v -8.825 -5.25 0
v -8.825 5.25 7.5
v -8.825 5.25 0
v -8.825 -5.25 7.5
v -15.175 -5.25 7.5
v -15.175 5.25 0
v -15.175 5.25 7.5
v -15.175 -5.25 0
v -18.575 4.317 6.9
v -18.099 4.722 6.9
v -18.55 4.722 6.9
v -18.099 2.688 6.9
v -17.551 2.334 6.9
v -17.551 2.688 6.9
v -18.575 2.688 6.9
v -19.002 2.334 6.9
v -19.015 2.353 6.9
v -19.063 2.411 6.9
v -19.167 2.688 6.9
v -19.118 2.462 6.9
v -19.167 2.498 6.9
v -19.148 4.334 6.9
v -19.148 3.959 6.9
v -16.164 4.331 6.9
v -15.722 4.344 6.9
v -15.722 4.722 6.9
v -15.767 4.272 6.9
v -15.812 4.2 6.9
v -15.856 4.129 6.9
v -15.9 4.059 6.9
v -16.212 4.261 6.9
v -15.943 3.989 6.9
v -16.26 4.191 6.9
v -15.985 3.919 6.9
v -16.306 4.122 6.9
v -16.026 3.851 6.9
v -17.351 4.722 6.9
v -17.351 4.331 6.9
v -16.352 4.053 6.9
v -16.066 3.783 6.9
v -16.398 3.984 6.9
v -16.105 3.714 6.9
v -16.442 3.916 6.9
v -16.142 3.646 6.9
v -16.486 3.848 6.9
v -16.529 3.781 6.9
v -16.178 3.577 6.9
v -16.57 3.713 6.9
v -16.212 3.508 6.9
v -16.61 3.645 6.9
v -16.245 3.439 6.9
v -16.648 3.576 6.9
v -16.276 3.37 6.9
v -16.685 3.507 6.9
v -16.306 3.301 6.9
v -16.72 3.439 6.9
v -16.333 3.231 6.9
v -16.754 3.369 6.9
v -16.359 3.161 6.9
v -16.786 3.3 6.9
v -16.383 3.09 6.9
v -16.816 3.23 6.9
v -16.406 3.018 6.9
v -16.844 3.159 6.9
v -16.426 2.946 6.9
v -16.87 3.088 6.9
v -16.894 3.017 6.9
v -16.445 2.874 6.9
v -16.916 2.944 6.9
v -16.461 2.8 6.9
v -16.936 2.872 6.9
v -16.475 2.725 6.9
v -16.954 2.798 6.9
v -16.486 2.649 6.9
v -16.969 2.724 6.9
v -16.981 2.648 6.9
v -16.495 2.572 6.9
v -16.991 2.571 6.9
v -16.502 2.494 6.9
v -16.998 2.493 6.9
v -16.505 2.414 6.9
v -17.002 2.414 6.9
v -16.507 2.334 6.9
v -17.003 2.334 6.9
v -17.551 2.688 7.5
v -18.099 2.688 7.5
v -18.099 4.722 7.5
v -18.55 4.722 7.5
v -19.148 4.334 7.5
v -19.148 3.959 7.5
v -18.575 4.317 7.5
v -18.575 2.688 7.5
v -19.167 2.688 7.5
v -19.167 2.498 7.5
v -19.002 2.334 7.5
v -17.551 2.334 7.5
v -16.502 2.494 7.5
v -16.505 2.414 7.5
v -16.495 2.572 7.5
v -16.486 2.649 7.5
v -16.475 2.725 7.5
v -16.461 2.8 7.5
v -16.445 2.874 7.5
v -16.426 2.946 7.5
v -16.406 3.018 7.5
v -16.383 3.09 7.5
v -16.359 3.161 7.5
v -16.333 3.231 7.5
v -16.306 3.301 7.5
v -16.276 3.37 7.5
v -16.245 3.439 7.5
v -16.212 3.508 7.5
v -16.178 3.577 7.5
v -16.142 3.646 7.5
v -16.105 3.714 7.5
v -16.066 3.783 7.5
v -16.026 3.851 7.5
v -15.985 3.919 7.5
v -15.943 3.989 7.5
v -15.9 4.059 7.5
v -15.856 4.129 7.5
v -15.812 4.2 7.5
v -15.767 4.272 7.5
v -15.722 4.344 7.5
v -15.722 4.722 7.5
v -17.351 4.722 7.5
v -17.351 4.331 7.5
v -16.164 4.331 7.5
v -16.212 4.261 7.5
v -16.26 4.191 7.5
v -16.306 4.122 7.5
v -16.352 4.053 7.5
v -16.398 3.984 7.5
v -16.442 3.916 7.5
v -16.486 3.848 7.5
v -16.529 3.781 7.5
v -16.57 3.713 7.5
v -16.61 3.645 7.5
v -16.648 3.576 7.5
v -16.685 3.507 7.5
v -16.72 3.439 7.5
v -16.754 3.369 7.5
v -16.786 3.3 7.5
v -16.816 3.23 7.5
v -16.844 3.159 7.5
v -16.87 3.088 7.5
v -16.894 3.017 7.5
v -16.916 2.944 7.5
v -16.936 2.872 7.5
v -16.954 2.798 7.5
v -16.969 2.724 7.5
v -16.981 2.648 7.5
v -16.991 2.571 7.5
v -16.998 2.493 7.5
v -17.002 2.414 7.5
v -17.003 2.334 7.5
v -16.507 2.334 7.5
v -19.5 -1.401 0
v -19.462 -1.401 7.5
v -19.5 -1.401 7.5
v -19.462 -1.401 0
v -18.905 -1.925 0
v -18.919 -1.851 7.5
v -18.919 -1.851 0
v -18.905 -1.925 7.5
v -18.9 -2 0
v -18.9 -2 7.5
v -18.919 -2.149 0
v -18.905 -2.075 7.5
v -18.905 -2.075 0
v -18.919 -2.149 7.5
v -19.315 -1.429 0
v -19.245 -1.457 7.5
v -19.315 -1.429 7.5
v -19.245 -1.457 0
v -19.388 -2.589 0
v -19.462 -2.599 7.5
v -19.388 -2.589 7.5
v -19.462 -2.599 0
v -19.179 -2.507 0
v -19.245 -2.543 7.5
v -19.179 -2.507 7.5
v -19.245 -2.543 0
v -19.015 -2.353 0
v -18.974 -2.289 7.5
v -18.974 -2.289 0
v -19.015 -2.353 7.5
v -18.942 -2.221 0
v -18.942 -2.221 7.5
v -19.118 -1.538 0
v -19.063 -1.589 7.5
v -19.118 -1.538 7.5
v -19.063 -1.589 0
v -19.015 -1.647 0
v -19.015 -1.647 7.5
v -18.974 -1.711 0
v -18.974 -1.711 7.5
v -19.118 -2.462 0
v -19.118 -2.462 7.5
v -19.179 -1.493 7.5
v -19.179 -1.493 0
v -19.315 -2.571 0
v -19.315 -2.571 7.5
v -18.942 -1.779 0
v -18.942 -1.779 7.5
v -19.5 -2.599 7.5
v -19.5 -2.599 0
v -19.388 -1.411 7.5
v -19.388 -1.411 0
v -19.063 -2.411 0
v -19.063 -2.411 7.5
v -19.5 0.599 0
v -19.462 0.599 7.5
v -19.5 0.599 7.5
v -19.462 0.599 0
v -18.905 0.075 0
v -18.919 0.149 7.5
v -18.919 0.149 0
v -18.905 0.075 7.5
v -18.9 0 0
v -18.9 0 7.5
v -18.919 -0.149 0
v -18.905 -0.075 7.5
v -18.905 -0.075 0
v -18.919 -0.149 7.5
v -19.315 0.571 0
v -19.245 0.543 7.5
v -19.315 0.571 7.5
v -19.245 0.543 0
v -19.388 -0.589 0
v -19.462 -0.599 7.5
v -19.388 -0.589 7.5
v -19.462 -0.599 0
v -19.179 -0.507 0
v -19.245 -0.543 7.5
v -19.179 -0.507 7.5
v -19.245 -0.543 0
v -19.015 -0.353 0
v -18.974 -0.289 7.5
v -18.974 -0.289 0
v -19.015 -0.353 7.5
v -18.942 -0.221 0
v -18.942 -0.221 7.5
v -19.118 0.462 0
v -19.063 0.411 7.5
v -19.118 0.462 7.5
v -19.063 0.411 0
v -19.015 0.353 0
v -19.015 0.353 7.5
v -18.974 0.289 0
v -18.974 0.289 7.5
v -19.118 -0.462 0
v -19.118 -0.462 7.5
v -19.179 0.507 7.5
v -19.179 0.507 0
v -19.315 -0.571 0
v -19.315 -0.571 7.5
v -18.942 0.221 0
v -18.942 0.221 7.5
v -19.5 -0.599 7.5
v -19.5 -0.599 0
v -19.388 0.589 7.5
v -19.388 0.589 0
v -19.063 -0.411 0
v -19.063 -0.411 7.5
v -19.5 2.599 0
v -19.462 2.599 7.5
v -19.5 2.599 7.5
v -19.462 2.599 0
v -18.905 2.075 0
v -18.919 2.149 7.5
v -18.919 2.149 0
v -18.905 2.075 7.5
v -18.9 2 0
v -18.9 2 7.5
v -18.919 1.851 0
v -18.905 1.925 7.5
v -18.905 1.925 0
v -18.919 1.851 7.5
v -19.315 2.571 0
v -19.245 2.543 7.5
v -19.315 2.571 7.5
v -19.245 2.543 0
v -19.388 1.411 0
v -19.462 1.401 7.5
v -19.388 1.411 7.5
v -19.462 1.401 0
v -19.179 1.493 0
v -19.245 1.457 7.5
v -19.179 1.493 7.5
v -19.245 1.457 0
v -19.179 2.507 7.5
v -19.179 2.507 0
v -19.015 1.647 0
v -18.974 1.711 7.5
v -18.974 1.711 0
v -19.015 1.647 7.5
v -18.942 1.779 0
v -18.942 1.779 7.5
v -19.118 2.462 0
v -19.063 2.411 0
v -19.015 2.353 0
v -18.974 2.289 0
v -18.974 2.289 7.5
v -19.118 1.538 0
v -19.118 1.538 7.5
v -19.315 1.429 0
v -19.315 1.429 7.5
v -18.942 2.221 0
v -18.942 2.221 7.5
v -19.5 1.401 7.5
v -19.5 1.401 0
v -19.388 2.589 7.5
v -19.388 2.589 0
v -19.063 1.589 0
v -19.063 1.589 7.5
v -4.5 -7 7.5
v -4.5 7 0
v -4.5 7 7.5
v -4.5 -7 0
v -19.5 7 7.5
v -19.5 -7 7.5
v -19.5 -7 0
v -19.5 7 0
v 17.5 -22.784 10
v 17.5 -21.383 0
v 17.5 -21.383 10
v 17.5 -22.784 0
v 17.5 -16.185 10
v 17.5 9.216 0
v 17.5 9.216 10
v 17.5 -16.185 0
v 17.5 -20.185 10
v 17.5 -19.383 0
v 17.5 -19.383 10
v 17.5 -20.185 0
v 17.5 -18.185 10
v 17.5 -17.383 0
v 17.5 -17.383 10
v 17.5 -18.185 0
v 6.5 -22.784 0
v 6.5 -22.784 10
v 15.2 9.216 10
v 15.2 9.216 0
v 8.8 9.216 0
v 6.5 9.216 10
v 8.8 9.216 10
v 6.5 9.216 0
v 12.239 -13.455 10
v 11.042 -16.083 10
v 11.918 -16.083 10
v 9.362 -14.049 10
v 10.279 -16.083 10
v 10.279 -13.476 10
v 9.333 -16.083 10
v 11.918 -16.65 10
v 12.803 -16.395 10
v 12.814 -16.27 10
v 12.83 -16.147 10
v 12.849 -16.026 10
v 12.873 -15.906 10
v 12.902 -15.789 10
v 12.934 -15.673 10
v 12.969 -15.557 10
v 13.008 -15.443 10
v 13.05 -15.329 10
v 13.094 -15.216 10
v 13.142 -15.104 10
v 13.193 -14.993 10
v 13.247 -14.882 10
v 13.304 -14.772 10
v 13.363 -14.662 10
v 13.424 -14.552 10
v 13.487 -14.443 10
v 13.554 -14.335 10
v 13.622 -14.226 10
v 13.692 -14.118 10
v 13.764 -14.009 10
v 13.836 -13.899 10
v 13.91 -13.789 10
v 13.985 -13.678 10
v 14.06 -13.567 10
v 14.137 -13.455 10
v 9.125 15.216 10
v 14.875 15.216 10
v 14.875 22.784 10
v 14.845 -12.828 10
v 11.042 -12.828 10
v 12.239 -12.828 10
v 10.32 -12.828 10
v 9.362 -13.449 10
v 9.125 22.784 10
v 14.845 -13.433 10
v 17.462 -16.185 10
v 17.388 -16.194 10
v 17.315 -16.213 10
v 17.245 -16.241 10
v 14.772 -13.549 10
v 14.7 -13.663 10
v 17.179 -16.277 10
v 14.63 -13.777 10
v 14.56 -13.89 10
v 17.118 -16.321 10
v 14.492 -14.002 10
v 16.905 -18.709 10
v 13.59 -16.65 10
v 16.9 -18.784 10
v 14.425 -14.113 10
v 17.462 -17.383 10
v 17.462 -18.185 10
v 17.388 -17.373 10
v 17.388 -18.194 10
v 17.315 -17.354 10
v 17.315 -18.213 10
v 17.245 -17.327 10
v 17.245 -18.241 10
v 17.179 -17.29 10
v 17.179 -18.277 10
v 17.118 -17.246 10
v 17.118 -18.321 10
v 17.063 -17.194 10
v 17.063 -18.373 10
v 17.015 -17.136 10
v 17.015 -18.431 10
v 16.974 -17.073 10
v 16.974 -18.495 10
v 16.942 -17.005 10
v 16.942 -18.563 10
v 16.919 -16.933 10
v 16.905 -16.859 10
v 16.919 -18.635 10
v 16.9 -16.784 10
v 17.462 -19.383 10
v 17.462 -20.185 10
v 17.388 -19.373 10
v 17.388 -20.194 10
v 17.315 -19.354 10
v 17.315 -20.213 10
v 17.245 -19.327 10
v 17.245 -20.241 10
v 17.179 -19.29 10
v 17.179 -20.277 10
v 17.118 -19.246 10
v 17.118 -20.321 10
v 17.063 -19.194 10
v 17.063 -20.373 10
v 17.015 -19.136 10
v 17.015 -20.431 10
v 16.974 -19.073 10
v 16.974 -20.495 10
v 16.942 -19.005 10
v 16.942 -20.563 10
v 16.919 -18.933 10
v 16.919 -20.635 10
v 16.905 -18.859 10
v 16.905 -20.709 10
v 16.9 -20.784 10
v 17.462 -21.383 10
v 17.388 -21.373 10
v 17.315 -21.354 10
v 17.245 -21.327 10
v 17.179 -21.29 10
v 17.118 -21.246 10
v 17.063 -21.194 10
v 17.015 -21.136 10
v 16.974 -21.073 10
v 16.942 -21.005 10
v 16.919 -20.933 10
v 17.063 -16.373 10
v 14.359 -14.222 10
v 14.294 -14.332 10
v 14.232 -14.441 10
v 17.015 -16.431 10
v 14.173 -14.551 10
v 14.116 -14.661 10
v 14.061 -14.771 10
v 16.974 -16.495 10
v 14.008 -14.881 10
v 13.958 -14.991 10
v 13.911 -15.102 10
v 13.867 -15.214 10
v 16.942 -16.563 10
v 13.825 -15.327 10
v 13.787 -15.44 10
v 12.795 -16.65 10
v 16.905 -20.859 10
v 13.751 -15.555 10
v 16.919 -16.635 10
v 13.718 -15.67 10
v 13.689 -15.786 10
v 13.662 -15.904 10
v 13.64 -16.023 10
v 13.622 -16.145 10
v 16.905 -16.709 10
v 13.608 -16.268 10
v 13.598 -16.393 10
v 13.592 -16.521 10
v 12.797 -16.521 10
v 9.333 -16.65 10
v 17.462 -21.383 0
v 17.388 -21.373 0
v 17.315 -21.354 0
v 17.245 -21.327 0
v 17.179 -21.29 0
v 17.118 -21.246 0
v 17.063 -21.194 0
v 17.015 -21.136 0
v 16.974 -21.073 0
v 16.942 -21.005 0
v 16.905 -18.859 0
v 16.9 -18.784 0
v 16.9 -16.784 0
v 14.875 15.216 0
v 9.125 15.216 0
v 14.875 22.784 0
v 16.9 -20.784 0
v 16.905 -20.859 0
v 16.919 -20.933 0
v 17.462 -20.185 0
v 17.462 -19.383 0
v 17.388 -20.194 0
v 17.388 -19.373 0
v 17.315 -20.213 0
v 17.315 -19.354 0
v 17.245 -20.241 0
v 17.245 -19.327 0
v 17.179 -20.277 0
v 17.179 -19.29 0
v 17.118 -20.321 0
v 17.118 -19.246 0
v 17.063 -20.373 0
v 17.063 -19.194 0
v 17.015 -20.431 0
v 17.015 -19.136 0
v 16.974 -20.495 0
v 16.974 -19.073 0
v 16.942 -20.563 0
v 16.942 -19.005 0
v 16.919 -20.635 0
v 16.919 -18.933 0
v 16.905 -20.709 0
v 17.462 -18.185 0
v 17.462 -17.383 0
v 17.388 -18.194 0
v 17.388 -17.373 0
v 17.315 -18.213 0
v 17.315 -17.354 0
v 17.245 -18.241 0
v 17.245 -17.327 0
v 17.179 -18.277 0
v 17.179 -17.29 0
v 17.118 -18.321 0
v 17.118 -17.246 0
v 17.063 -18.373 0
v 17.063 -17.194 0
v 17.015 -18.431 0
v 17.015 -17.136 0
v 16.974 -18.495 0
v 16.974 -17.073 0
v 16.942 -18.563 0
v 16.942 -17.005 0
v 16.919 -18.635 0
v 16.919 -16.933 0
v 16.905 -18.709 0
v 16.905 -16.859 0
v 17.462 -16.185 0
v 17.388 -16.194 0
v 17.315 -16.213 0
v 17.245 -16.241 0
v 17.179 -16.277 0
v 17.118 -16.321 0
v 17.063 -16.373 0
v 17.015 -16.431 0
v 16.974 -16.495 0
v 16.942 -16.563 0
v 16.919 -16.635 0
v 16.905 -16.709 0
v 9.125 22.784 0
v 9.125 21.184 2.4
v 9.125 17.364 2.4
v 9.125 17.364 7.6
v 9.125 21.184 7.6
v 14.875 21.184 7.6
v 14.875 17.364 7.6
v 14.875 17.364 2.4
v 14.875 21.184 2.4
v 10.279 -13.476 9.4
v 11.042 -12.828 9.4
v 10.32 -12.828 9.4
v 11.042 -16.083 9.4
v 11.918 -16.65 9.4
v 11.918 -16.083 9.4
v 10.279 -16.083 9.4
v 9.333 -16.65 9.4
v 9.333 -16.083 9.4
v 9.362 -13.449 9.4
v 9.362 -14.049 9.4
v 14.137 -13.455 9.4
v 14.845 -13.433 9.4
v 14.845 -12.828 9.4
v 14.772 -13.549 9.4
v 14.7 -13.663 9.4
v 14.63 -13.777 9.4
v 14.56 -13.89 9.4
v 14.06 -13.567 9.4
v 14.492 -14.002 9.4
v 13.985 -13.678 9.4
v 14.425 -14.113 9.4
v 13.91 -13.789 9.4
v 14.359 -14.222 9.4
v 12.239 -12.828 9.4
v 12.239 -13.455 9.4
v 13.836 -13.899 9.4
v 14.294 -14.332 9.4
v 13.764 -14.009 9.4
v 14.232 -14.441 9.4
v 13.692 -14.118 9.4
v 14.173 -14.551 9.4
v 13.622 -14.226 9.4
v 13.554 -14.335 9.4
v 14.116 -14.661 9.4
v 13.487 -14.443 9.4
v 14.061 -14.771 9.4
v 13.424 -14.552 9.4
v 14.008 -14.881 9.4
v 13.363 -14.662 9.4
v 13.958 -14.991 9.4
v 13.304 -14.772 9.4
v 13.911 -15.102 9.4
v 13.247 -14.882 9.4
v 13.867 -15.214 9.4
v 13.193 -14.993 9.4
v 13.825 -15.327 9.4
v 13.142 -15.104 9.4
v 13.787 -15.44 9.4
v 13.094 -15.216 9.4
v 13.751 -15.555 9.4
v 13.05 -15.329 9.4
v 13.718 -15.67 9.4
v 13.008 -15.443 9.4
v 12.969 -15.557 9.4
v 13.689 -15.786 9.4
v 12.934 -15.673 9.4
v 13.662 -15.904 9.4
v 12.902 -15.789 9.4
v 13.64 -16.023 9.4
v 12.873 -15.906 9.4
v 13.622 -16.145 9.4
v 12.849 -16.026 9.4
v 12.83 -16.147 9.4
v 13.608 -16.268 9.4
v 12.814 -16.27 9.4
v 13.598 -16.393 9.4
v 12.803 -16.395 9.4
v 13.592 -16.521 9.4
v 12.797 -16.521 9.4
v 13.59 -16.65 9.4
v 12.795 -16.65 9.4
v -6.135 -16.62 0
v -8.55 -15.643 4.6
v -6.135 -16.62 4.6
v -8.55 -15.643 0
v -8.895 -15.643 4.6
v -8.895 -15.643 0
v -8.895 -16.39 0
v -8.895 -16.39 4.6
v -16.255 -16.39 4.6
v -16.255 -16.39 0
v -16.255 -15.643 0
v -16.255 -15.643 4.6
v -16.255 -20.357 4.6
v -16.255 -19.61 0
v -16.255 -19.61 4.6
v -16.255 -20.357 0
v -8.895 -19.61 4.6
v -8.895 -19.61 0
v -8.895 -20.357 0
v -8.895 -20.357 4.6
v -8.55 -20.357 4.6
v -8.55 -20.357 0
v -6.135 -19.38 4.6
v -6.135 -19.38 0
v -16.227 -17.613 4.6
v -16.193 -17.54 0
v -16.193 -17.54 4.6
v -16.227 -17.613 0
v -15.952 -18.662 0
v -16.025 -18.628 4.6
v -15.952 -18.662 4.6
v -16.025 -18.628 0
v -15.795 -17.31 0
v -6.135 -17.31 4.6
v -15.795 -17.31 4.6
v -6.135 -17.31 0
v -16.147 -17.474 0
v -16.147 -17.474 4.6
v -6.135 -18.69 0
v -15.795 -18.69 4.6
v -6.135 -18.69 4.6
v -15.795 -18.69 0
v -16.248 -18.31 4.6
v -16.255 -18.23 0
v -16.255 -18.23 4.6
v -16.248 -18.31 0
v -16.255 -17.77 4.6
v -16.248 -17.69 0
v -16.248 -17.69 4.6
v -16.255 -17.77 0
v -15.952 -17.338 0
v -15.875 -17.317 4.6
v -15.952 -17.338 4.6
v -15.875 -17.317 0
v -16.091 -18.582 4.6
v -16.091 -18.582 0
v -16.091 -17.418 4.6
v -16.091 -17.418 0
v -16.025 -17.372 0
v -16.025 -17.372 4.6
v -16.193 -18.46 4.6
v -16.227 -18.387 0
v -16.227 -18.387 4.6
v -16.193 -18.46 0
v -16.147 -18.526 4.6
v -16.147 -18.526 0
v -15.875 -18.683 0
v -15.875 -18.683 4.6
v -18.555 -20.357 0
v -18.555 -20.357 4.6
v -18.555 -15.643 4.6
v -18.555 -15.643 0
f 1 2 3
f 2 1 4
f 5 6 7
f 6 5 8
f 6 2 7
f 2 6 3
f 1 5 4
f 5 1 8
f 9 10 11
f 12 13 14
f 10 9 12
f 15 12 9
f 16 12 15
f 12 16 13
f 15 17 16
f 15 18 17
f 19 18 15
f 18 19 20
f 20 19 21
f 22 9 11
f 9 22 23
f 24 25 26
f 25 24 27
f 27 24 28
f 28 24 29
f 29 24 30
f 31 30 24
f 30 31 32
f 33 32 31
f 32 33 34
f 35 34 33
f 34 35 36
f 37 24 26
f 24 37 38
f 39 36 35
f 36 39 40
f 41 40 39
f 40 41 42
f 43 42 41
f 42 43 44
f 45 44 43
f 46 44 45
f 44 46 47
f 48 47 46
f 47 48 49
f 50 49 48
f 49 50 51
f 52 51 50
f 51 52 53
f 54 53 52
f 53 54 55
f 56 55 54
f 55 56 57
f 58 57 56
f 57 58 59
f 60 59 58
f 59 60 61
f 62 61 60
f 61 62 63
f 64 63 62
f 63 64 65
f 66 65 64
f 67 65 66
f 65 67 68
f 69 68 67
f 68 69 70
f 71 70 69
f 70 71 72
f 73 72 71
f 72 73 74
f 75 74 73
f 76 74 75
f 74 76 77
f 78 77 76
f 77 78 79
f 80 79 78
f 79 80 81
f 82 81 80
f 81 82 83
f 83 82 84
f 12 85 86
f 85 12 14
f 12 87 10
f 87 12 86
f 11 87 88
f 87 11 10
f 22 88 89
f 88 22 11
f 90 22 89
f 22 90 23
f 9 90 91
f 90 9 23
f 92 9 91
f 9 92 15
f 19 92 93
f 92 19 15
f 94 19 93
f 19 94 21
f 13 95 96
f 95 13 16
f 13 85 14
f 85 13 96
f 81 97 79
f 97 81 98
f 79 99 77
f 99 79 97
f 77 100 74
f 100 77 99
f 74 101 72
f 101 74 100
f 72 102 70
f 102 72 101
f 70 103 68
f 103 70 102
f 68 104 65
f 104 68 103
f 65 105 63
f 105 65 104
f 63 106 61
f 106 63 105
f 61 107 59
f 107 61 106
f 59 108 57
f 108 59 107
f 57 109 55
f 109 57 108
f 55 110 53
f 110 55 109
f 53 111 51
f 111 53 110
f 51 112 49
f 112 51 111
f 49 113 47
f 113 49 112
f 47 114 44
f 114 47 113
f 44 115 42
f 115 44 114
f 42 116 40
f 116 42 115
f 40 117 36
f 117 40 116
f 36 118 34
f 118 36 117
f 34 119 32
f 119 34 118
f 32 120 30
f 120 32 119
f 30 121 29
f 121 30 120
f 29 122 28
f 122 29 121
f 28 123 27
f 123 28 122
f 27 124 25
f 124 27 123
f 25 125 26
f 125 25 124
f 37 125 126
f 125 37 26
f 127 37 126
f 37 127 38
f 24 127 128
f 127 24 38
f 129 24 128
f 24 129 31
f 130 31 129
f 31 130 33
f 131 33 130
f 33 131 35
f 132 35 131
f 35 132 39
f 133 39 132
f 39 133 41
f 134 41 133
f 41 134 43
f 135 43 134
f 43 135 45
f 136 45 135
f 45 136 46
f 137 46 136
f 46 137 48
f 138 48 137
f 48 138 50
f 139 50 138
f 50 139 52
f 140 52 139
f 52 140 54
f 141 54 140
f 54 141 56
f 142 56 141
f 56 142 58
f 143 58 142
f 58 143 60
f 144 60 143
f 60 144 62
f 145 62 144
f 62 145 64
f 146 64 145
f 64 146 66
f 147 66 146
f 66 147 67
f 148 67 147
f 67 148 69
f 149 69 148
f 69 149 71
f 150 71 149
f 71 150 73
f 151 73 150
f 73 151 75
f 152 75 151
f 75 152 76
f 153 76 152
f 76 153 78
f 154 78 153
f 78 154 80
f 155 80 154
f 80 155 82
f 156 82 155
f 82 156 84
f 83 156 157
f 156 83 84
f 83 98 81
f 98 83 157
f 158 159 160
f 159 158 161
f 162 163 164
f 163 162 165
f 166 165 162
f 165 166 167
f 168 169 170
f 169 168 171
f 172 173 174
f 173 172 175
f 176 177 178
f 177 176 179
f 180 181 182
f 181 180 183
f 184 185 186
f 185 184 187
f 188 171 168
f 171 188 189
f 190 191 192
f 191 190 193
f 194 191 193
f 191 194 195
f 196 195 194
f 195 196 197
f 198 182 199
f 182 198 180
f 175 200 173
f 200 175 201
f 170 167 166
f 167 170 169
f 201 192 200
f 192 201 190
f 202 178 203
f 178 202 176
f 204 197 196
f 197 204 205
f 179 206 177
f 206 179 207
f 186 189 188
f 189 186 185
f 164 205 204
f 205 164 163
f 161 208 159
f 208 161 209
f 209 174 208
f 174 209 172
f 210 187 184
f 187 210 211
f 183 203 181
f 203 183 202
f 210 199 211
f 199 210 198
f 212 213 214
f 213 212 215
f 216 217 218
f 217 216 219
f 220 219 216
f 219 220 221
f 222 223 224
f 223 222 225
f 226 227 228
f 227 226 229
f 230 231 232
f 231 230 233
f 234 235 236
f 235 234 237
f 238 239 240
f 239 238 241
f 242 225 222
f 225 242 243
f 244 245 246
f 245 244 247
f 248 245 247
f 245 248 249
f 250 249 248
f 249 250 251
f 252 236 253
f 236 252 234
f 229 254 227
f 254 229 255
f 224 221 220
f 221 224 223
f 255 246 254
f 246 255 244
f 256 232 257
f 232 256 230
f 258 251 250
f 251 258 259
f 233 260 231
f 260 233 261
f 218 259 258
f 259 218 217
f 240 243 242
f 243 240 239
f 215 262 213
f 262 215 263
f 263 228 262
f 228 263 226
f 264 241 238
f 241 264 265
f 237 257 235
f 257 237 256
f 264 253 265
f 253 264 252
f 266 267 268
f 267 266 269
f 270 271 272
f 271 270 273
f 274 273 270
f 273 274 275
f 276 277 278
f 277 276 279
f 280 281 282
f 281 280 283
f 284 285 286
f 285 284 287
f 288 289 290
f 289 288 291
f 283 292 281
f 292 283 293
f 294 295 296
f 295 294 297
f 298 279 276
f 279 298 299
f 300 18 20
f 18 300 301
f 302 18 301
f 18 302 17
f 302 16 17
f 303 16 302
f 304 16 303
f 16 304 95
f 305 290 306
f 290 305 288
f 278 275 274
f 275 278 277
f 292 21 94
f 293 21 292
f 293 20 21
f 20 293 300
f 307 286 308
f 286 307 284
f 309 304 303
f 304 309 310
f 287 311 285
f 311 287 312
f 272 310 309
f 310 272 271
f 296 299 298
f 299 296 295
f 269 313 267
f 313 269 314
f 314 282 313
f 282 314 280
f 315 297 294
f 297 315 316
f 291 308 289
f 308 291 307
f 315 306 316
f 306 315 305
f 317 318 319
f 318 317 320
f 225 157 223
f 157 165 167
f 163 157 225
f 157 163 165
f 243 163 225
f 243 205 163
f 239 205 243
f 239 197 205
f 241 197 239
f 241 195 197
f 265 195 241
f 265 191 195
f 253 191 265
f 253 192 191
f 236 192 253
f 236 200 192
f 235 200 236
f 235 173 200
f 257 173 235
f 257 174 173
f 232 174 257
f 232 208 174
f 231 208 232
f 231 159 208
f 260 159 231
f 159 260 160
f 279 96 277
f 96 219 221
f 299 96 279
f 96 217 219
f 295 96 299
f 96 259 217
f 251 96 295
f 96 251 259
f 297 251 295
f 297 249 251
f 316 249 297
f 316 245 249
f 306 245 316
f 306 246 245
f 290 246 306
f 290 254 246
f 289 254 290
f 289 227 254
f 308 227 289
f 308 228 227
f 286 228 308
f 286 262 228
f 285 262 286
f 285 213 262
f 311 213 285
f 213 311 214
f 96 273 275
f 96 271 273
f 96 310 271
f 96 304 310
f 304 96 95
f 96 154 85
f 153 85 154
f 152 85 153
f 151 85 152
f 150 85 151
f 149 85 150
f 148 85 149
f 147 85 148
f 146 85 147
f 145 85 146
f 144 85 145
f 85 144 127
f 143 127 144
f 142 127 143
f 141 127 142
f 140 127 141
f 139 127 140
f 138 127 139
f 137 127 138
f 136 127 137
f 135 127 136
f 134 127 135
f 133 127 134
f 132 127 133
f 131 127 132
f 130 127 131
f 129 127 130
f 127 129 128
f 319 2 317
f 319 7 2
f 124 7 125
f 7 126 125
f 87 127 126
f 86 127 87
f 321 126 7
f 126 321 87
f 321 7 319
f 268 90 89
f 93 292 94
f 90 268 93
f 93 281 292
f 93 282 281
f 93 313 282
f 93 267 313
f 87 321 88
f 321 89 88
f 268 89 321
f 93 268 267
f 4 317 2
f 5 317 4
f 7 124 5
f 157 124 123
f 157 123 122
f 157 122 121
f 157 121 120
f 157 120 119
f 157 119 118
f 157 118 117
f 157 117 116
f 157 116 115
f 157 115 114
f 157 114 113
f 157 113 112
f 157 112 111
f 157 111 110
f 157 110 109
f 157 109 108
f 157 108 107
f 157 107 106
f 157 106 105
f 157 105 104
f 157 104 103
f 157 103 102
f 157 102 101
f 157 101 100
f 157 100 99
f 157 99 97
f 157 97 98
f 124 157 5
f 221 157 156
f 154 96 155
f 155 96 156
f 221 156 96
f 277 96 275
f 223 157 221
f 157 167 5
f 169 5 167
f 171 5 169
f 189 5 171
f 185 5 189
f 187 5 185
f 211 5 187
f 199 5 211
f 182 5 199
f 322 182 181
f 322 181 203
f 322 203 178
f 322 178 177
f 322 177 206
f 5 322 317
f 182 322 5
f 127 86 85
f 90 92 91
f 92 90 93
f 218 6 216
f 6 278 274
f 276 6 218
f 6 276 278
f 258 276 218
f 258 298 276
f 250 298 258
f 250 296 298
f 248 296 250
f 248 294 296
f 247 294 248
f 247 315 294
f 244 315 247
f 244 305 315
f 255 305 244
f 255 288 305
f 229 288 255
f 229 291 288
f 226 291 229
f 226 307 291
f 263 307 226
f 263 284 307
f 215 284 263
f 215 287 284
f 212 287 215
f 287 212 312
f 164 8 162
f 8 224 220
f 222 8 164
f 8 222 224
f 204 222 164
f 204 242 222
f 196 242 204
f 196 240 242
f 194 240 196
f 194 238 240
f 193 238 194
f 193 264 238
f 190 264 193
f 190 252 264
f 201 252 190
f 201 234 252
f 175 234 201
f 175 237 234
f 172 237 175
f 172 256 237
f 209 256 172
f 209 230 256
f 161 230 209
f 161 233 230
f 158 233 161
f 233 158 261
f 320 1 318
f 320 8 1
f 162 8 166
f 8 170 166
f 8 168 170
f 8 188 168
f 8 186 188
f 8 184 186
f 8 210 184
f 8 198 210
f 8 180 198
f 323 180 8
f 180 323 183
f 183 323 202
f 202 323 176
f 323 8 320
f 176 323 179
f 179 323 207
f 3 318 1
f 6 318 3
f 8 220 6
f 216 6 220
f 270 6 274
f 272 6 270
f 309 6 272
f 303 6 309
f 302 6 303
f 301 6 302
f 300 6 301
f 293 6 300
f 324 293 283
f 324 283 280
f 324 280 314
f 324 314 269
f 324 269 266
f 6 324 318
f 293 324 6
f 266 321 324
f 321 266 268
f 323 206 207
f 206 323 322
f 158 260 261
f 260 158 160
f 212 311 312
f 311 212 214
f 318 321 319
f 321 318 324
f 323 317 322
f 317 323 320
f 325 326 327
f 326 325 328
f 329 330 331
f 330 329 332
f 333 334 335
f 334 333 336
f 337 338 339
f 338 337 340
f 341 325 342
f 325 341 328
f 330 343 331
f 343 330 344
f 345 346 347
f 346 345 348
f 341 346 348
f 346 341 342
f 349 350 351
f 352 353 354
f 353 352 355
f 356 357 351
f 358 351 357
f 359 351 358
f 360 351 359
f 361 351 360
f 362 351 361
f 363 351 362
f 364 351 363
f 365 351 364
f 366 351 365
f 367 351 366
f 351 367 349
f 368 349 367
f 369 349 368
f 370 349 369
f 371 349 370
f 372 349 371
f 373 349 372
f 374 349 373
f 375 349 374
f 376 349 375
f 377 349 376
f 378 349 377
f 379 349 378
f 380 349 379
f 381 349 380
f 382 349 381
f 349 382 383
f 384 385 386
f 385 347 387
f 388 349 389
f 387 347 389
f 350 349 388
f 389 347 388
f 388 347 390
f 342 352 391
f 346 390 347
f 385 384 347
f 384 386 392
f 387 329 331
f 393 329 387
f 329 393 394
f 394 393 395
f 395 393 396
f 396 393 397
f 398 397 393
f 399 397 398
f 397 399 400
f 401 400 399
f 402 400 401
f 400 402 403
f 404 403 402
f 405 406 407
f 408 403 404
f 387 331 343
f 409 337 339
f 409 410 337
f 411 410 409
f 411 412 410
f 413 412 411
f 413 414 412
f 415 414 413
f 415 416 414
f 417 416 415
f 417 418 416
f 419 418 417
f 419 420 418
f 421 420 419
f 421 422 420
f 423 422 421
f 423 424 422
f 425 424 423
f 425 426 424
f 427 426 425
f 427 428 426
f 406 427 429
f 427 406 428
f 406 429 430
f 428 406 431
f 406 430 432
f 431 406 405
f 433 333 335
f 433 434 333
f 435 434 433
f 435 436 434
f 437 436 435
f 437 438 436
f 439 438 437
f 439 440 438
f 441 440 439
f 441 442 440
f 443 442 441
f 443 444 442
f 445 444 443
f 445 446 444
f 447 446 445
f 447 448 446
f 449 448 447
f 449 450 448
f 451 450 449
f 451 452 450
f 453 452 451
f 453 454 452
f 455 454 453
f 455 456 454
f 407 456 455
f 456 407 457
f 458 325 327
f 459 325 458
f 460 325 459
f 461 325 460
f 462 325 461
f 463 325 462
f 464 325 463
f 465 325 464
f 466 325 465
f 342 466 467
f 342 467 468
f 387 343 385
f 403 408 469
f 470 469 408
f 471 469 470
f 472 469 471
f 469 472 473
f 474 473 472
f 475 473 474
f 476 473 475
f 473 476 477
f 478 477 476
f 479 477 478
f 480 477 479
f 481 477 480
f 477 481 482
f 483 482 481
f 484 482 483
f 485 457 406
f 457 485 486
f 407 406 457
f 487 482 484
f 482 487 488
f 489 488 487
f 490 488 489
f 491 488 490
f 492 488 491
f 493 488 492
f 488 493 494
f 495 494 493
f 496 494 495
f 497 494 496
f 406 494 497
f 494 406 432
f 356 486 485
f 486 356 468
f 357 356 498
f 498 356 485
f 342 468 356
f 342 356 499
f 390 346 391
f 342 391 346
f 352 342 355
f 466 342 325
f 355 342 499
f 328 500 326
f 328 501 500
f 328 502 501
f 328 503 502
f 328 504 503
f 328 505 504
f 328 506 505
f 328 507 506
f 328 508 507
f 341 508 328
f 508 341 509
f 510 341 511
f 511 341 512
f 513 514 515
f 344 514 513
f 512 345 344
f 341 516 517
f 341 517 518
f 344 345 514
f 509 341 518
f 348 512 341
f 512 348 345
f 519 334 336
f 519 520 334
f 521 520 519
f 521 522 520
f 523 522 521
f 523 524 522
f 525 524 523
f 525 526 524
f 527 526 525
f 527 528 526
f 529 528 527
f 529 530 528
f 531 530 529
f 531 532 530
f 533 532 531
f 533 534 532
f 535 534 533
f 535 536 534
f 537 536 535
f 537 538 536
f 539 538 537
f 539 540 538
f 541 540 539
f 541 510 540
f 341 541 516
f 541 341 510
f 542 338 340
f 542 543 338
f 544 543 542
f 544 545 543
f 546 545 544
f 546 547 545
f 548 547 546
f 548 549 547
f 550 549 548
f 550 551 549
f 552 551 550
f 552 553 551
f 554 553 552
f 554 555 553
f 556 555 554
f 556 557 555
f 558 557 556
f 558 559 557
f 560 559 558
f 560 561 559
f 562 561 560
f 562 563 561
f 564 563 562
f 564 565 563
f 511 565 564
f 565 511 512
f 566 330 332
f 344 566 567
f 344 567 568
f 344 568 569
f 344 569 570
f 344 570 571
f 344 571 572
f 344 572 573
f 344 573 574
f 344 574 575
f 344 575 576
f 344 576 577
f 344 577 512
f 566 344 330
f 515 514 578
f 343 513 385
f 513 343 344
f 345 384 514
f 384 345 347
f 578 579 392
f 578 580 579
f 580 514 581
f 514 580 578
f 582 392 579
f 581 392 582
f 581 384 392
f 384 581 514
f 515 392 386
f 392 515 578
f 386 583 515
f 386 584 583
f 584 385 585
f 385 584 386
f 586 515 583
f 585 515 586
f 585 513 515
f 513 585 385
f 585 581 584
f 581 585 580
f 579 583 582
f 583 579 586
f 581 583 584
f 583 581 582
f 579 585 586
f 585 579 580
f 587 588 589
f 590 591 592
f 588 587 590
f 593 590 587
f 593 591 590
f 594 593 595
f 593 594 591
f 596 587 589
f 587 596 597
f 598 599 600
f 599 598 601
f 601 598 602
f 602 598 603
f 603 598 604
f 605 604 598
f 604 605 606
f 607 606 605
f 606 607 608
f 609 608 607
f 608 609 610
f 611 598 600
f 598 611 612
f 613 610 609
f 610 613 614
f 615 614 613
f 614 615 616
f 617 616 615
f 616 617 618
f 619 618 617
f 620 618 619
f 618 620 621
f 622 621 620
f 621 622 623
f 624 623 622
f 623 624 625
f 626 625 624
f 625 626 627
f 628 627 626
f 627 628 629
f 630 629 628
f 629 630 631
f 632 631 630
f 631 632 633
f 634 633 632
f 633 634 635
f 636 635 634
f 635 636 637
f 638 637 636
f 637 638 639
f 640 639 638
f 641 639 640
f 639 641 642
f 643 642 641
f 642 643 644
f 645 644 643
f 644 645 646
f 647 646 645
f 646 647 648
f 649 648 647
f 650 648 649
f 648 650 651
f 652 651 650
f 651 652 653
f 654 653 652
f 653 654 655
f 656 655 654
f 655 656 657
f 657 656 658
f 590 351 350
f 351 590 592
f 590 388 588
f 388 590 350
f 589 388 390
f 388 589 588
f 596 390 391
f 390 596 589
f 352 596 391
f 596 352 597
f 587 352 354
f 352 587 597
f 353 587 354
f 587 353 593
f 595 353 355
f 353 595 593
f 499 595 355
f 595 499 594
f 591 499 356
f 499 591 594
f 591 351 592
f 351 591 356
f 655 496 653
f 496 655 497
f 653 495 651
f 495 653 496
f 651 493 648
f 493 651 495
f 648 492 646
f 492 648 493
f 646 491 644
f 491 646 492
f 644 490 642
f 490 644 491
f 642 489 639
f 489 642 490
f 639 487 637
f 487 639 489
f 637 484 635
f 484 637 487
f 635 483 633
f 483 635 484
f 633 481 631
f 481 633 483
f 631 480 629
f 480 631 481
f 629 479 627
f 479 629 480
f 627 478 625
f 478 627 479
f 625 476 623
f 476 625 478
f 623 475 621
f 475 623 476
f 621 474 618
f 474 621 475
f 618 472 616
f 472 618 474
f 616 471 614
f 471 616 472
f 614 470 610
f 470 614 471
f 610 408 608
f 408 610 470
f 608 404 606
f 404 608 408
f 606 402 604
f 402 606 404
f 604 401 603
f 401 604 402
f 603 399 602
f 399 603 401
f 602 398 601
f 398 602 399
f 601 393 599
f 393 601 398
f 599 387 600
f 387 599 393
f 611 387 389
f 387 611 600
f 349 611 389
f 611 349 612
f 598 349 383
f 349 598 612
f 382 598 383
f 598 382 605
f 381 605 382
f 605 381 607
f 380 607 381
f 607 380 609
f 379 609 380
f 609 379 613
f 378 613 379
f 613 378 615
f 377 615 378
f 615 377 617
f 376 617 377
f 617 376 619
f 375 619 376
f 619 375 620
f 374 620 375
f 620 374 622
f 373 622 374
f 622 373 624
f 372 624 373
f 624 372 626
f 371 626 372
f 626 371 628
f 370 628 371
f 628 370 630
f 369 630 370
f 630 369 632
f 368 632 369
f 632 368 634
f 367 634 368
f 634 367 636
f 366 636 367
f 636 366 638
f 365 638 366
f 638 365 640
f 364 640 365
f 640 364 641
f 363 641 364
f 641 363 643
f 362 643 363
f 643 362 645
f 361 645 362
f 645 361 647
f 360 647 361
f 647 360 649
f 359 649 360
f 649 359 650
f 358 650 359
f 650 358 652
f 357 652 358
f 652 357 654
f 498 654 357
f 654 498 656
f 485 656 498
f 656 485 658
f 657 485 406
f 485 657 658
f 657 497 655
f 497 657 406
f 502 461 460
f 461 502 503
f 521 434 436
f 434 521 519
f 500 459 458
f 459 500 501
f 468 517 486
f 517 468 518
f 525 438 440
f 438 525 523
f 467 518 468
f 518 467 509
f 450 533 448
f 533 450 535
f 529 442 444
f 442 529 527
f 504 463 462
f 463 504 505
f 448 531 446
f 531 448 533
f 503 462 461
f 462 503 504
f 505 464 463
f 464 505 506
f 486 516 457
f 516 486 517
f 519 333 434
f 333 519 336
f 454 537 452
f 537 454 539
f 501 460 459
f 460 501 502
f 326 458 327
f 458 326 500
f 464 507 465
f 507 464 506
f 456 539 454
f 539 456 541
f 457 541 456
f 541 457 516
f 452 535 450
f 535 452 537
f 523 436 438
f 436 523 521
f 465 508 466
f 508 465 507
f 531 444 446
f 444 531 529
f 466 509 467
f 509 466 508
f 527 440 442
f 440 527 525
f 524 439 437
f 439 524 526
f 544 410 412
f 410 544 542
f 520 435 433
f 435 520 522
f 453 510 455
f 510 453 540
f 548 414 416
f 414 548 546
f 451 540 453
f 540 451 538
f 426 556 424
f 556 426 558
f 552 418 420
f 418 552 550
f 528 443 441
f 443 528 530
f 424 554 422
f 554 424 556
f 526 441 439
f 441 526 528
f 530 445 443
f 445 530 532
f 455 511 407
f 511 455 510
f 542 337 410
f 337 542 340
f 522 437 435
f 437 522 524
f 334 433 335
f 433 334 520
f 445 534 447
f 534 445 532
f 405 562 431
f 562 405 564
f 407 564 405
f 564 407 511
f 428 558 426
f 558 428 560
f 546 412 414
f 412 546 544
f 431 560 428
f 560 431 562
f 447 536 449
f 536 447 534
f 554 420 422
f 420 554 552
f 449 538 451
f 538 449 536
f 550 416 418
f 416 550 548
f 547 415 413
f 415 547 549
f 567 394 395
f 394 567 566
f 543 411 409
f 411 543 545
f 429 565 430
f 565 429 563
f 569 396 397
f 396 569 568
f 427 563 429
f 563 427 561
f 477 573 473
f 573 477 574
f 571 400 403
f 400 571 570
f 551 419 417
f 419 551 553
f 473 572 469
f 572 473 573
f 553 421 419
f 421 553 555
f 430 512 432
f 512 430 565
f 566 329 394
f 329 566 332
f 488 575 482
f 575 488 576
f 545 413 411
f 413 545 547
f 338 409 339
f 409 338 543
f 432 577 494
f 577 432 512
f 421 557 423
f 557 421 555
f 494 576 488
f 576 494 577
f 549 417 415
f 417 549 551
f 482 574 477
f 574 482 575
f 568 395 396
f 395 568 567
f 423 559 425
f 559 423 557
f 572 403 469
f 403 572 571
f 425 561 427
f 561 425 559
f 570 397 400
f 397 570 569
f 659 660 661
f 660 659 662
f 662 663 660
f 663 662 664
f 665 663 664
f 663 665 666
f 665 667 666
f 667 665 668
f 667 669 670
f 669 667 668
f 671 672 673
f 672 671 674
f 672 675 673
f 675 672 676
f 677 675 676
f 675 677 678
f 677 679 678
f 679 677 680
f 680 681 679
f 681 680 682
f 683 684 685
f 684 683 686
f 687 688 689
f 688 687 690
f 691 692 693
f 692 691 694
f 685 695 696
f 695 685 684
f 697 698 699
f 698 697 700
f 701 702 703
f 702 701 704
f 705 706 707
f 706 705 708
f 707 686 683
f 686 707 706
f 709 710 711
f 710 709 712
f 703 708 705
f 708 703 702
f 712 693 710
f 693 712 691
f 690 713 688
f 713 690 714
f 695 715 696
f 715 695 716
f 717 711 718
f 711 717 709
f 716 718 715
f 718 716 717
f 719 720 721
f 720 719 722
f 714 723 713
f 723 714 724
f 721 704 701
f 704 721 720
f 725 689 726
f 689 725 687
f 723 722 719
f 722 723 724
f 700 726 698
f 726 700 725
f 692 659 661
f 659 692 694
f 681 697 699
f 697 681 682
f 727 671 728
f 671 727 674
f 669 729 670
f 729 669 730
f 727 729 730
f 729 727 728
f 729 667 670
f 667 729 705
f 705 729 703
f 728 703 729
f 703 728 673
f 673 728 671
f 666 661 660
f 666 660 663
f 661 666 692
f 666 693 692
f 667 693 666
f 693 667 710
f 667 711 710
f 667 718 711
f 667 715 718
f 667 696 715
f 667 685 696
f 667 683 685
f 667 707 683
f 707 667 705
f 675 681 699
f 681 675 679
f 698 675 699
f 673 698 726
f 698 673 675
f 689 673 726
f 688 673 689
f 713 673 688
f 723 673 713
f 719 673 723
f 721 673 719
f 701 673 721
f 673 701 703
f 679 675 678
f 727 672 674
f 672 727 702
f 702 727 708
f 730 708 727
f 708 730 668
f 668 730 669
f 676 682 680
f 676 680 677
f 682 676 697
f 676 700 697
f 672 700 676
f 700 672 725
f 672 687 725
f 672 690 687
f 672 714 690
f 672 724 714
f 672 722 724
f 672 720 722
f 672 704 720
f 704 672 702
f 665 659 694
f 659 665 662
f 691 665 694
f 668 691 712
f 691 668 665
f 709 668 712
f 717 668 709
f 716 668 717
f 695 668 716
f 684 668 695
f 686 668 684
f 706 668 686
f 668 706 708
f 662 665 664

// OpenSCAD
$fn = 50;

difference() {
	union() {
		translate(v = [-12, -5, 0]) {
			rotate(a = [0, 0, 0]) {
				difference() {
					union() {
						translate(v = [-7.5, -2.0, 0]) {
							cube(size = [15.0, 14.0, 7.5]);
						}
					}
					union() {
						translate(v = [-3.175, -0.25, -0.1]) {
							cube(size = [6.35, 10.5, 7.7]);
						}
						translate(v = [-5.5, 8.5, 6.9]) {
							linear_extrude(height = 0.7) {
								text(font = "Arial:style=Bold", halign = "center", size = 2.5, text = "17", valign = "center");
							}
						}
						translate(v = [-7.5, 3, -0.1]) {
							cylinder(h = 7.7, r = 0.6);
						}
						translate(v = [-7.5, 5, -0.1]) {
							cylinder(h = 7.7, r = 0.6);
						}
						translate(v = [-7.5, 7, -0.1]) {
							cylinder(h = 7.7, r = 0.6);
						}
					}
				}
			}
		}
		translate(v = [12, 9.21625, 0]) {
			rotate(a = [90, 0, 0]) {
				difference() {
					union() {
						translate(v = [-5.5, 0, 0]) {
							cube(size = [11.0, 10.0, 32.0]);
						}
						translate(v = [0, 10.0, 0]) {
							rotate(a = [90, 0, 0]) {
								linear_extrude(height = 10.0) {
									polygon(points = [[-2.875, -13.5675], [2.875, -13.5675], [2.875, -6.0], [3.2, 0], [3.2, 0.1], [-3.2, 0.1], [-3.2, 0], [-2.875, -6.0]]);
								}
							}
						}
					}
					union() {
						translate(v = [-2.975, 2.4000000000000004, -11.9675]) {
							cube(size = [5.95, 5.199999999999999, 3.8200000000000003]);
						}
						translate(v = [0, 9.4, 24.0]) {
							rotate(a = [-90, 0, 0]) {
								linear_extrude(height = 0.7) {
									text(font = "Arial:style=Bold", halign = "center", size = 4.0, text = "17", valign = "center");
								}
							}
						}
						translate(v = [5.5, 10.1, 30.0]) {
							rotate(a = [90, 0, 0]) {
								cylinder(h = 10.2, r = 0.6);
							}
						}
						translate(v = [5.5, 10.1, 28.0]) {
							rotate(a = [90, 0, 0]) {
								cylinder(h = 10.2, r = 0.6);
							}
						}
						translate(v = [5.5, 10.1, 26.0]) {
							rotate(a = [90, 0, 0]) {
								cylinder(h = 10.2, r = 0.6);
							}
						}
					}
				}
			}
		}
		translate(v = [-12, -18, 0]) {
			rotate(a = [90, 0, 0]) {
				difference() {
					union() {
						translate(v = [-6.555, 0, -2.3575]) {
							cube(size = [12.42, 4.6, 4.715]);
						}
					}
					union() {
						translate(v = [0, 4.699999999999999, 0]) {
							rotate(a = [90, 0, 0]) {
								linear_extrude(height = 4.8) {
									polygon(points = [[-4.255, -1.61], [3.105, -1.61], [3.105, -2.3575], [3.45, -2.3575], [5.865, -1.38], [5.965, -1.38], [5.965, -2.4575], [-4.255, -2.4575]]);
								}
							}
						}
						translate(v = [0, 4.699999999999999, 0]) {
							rotate(a = [90, 0, 0]) {
								linear_extrude(height = 4.8) {
									polygon(points = [[-4.255, 1.61], [3.105, 1.61], [3.105, 2.3575], [3.45, 2.3575], [5.865, 1.38], [5.965, 1.38], [5.965, 2.4575], [-4.255, 2.4575]]);
								}
							}
						}
						translate(v = [0, 4.699999999999999, 0]) {
							rotate(a = [90, 0, 0]) {
								linear_extrude(height = 4.8) {
									polygon(points = [[-4.255, 0.23], [-4.248012, 0.309878], [-4.227259, 0.387329], [-4.193372, 0.46], [-4.14738, 0.525682], [-4.090682, 0.58238], [-4.025, 0.628372], [-3.952329, 0.662259], [-3.874878, 0.683012], [-3.795, 0.69], [5.965, 0.69], [5.965, -0.69], [-3.795, -0.69], [-3.874878, -0.683012], [-3.952329, -0.662259], [-4.025, -0.628372], [-4.090682, -0.58238], [-4.14738, -0.525682], [-4.193372, -0.46], [-4.227259, -0.387329], [-4.248012, -0.309878], [-4.255, -0.23]]);
								}
							}
						}
					}
				}
			}
		}
	}
	union();
}
